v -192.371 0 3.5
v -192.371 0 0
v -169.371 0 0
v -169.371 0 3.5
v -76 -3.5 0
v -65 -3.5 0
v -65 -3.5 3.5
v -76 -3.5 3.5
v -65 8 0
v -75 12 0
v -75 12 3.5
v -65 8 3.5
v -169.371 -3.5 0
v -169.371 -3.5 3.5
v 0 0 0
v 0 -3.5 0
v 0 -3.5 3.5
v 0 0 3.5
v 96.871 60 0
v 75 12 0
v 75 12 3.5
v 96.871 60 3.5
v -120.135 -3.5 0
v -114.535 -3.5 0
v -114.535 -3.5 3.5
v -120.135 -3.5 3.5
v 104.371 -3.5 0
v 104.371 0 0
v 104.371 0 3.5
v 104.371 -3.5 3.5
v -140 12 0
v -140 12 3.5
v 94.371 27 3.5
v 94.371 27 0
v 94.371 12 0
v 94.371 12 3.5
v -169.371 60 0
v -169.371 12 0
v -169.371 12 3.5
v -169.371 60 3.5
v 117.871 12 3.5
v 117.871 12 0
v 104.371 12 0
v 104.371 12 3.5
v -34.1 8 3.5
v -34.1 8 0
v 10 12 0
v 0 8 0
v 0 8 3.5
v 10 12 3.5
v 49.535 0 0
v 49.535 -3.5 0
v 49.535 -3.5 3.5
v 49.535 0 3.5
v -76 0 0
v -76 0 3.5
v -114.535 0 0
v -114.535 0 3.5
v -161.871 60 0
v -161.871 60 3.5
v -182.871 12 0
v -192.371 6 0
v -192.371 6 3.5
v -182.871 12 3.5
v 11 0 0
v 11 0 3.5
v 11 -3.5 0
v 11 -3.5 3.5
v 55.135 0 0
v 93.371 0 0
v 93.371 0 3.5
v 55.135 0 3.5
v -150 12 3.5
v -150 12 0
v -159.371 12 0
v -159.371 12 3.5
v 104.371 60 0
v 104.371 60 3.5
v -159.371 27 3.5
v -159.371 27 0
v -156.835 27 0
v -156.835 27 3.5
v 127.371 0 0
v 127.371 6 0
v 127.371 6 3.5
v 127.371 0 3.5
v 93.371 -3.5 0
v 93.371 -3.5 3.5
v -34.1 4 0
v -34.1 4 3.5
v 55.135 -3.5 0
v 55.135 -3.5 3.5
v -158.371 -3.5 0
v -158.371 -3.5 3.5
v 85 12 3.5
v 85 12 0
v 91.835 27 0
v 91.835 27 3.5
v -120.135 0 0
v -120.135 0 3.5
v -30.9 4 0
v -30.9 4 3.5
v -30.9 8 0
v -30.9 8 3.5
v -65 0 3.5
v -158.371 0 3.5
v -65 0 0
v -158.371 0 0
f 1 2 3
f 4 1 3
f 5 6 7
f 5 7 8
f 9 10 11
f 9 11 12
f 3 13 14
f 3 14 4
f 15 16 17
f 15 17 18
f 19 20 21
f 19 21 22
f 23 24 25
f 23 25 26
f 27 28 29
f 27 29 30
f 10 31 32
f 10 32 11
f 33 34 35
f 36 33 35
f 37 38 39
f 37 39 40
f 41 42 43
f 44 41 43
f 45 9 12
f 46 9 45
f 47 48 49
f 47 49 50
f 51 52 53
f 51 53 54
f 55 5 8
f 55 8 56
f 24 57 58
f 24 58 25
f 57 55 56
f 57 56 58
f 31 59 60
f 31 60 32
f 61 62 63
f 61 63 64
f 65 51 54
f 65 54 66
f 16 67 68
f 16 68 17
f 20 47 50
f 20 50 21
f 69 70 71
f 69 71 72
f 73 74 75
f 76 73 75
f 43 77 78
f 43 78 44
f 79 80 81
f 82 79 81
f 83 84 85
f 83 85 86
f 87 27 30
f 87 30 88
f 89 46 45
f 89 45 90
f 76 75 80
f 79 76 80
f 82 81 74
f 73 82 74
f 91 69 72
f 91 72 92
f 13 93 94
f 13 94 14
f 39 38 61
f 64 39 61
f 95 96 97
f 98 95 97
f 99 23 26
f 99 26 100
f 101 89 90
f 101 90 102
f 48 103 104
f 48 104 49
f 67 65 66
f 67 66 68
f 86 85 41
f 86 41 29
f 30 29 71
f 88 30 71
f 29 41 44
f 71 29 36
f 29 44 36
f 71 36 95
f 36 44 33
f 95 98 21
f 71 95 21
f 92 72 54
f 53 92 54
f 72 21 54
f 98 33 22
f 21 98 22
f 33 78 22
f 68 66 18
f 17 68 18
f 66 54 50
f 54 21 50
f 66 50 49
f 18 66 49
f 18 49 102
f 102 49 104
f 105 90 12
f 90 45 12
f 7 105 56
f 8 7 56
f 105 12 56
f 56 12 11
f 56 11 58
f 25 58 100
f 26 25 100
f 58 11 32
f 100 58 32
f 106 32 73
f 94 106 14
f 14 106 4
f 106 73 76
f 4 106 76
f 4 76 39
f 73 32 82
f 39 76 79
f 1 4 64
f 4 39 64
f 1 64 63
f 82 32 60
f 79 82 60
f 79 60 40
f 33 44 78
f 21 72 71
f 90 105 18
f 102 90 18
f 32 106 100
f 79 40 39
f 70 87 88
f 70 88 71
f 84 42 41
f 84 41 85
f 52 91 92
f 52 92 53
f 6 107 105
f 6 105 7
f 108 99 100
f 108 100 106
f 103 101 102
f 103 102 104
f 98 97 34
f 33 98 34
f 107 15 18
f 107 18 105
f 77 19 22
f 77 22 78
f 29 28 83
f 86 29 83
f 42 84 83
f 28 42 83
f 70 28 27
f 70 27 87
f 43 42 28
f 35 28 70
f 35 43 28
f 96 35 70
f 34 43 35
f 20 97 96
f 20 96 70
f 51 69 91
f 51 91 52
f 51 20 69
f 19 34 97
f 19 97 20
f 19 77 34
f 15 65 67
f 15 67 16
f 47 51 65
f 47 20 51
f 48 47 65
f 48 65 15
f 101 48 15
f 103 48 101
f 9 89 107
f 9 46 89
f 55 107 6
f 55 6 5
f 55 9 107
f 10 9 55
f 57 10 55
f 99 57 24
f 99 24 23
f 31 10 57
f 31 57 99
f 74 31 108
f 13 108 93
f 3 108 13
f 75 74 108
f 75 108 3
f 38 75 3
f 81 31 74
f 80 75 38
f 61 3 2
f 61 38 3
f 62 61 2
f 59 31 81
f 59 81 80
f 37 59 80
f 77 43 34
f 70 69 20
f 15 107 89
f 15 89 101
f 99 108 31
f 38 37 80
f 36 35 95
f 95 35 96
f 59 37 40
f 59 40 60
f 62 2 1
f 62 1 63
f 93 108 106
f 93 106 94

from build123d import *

# Parameters (mm, degrees)
BOSS_EXTRUDE1_DEPTH = 3.5


with BuildPart() as part:
    # Sketch1 → Boss-Extrude1 (new body)
    with BuildSketch(Plane.XY):
        Polygon((75, 12), (96.871, 60), (104.371, 60), (104.371, 12), (108.371, 12), (117.871, 12), (127.371, 6), (127.371, 0), (112.371, 0), (104.371, 0), (104.371, -3.5), (93.371, -3.5), (93.371, 0), (55.135445, 0), (55.135445, -3.5), (49.535445, -3.5), (49.535445, 0), (11, 0), (11, -3.5), (0, -3.5), (0, 0), (-65, 0), (-65, -3.5), (-76, -3.5), (-76, 0), (-114.535445, 0), (-114.535445, -3.5), (-120.135445, -3.5), (-120.135445, 0), (-158.371, 0), (-158.371, -3.5), (-169.371, -3.5), (-169.371, 0), (-177.371, 0), (-192.371, 0), (-192.371, 6), (-182.871, 12), (-173.371, 12), (-169.371, 12), (-169.371, 60), (-161.871, 60), (-140, 12), (-75, 12), (-65, 8), (-34.1, 8), (-34.1, 4), (-30.9, 4), (-30.9, 8), (0, 8), (10, 12), align=None)
        Polygon((85, 12), (91.8346875, 27), (94.371, 27), (94.371, 12), align=None, mode=Mode.SUBTRACT)
        Polygon((-150, 12), (-159.371, 12), (-159.371, 27), (-156.8346875, 27), align=None, mode=Mode.SUBTRACT)
    extrude(amount=BOSS_EXTRUDE1_DEPTH)


solid = part.part
